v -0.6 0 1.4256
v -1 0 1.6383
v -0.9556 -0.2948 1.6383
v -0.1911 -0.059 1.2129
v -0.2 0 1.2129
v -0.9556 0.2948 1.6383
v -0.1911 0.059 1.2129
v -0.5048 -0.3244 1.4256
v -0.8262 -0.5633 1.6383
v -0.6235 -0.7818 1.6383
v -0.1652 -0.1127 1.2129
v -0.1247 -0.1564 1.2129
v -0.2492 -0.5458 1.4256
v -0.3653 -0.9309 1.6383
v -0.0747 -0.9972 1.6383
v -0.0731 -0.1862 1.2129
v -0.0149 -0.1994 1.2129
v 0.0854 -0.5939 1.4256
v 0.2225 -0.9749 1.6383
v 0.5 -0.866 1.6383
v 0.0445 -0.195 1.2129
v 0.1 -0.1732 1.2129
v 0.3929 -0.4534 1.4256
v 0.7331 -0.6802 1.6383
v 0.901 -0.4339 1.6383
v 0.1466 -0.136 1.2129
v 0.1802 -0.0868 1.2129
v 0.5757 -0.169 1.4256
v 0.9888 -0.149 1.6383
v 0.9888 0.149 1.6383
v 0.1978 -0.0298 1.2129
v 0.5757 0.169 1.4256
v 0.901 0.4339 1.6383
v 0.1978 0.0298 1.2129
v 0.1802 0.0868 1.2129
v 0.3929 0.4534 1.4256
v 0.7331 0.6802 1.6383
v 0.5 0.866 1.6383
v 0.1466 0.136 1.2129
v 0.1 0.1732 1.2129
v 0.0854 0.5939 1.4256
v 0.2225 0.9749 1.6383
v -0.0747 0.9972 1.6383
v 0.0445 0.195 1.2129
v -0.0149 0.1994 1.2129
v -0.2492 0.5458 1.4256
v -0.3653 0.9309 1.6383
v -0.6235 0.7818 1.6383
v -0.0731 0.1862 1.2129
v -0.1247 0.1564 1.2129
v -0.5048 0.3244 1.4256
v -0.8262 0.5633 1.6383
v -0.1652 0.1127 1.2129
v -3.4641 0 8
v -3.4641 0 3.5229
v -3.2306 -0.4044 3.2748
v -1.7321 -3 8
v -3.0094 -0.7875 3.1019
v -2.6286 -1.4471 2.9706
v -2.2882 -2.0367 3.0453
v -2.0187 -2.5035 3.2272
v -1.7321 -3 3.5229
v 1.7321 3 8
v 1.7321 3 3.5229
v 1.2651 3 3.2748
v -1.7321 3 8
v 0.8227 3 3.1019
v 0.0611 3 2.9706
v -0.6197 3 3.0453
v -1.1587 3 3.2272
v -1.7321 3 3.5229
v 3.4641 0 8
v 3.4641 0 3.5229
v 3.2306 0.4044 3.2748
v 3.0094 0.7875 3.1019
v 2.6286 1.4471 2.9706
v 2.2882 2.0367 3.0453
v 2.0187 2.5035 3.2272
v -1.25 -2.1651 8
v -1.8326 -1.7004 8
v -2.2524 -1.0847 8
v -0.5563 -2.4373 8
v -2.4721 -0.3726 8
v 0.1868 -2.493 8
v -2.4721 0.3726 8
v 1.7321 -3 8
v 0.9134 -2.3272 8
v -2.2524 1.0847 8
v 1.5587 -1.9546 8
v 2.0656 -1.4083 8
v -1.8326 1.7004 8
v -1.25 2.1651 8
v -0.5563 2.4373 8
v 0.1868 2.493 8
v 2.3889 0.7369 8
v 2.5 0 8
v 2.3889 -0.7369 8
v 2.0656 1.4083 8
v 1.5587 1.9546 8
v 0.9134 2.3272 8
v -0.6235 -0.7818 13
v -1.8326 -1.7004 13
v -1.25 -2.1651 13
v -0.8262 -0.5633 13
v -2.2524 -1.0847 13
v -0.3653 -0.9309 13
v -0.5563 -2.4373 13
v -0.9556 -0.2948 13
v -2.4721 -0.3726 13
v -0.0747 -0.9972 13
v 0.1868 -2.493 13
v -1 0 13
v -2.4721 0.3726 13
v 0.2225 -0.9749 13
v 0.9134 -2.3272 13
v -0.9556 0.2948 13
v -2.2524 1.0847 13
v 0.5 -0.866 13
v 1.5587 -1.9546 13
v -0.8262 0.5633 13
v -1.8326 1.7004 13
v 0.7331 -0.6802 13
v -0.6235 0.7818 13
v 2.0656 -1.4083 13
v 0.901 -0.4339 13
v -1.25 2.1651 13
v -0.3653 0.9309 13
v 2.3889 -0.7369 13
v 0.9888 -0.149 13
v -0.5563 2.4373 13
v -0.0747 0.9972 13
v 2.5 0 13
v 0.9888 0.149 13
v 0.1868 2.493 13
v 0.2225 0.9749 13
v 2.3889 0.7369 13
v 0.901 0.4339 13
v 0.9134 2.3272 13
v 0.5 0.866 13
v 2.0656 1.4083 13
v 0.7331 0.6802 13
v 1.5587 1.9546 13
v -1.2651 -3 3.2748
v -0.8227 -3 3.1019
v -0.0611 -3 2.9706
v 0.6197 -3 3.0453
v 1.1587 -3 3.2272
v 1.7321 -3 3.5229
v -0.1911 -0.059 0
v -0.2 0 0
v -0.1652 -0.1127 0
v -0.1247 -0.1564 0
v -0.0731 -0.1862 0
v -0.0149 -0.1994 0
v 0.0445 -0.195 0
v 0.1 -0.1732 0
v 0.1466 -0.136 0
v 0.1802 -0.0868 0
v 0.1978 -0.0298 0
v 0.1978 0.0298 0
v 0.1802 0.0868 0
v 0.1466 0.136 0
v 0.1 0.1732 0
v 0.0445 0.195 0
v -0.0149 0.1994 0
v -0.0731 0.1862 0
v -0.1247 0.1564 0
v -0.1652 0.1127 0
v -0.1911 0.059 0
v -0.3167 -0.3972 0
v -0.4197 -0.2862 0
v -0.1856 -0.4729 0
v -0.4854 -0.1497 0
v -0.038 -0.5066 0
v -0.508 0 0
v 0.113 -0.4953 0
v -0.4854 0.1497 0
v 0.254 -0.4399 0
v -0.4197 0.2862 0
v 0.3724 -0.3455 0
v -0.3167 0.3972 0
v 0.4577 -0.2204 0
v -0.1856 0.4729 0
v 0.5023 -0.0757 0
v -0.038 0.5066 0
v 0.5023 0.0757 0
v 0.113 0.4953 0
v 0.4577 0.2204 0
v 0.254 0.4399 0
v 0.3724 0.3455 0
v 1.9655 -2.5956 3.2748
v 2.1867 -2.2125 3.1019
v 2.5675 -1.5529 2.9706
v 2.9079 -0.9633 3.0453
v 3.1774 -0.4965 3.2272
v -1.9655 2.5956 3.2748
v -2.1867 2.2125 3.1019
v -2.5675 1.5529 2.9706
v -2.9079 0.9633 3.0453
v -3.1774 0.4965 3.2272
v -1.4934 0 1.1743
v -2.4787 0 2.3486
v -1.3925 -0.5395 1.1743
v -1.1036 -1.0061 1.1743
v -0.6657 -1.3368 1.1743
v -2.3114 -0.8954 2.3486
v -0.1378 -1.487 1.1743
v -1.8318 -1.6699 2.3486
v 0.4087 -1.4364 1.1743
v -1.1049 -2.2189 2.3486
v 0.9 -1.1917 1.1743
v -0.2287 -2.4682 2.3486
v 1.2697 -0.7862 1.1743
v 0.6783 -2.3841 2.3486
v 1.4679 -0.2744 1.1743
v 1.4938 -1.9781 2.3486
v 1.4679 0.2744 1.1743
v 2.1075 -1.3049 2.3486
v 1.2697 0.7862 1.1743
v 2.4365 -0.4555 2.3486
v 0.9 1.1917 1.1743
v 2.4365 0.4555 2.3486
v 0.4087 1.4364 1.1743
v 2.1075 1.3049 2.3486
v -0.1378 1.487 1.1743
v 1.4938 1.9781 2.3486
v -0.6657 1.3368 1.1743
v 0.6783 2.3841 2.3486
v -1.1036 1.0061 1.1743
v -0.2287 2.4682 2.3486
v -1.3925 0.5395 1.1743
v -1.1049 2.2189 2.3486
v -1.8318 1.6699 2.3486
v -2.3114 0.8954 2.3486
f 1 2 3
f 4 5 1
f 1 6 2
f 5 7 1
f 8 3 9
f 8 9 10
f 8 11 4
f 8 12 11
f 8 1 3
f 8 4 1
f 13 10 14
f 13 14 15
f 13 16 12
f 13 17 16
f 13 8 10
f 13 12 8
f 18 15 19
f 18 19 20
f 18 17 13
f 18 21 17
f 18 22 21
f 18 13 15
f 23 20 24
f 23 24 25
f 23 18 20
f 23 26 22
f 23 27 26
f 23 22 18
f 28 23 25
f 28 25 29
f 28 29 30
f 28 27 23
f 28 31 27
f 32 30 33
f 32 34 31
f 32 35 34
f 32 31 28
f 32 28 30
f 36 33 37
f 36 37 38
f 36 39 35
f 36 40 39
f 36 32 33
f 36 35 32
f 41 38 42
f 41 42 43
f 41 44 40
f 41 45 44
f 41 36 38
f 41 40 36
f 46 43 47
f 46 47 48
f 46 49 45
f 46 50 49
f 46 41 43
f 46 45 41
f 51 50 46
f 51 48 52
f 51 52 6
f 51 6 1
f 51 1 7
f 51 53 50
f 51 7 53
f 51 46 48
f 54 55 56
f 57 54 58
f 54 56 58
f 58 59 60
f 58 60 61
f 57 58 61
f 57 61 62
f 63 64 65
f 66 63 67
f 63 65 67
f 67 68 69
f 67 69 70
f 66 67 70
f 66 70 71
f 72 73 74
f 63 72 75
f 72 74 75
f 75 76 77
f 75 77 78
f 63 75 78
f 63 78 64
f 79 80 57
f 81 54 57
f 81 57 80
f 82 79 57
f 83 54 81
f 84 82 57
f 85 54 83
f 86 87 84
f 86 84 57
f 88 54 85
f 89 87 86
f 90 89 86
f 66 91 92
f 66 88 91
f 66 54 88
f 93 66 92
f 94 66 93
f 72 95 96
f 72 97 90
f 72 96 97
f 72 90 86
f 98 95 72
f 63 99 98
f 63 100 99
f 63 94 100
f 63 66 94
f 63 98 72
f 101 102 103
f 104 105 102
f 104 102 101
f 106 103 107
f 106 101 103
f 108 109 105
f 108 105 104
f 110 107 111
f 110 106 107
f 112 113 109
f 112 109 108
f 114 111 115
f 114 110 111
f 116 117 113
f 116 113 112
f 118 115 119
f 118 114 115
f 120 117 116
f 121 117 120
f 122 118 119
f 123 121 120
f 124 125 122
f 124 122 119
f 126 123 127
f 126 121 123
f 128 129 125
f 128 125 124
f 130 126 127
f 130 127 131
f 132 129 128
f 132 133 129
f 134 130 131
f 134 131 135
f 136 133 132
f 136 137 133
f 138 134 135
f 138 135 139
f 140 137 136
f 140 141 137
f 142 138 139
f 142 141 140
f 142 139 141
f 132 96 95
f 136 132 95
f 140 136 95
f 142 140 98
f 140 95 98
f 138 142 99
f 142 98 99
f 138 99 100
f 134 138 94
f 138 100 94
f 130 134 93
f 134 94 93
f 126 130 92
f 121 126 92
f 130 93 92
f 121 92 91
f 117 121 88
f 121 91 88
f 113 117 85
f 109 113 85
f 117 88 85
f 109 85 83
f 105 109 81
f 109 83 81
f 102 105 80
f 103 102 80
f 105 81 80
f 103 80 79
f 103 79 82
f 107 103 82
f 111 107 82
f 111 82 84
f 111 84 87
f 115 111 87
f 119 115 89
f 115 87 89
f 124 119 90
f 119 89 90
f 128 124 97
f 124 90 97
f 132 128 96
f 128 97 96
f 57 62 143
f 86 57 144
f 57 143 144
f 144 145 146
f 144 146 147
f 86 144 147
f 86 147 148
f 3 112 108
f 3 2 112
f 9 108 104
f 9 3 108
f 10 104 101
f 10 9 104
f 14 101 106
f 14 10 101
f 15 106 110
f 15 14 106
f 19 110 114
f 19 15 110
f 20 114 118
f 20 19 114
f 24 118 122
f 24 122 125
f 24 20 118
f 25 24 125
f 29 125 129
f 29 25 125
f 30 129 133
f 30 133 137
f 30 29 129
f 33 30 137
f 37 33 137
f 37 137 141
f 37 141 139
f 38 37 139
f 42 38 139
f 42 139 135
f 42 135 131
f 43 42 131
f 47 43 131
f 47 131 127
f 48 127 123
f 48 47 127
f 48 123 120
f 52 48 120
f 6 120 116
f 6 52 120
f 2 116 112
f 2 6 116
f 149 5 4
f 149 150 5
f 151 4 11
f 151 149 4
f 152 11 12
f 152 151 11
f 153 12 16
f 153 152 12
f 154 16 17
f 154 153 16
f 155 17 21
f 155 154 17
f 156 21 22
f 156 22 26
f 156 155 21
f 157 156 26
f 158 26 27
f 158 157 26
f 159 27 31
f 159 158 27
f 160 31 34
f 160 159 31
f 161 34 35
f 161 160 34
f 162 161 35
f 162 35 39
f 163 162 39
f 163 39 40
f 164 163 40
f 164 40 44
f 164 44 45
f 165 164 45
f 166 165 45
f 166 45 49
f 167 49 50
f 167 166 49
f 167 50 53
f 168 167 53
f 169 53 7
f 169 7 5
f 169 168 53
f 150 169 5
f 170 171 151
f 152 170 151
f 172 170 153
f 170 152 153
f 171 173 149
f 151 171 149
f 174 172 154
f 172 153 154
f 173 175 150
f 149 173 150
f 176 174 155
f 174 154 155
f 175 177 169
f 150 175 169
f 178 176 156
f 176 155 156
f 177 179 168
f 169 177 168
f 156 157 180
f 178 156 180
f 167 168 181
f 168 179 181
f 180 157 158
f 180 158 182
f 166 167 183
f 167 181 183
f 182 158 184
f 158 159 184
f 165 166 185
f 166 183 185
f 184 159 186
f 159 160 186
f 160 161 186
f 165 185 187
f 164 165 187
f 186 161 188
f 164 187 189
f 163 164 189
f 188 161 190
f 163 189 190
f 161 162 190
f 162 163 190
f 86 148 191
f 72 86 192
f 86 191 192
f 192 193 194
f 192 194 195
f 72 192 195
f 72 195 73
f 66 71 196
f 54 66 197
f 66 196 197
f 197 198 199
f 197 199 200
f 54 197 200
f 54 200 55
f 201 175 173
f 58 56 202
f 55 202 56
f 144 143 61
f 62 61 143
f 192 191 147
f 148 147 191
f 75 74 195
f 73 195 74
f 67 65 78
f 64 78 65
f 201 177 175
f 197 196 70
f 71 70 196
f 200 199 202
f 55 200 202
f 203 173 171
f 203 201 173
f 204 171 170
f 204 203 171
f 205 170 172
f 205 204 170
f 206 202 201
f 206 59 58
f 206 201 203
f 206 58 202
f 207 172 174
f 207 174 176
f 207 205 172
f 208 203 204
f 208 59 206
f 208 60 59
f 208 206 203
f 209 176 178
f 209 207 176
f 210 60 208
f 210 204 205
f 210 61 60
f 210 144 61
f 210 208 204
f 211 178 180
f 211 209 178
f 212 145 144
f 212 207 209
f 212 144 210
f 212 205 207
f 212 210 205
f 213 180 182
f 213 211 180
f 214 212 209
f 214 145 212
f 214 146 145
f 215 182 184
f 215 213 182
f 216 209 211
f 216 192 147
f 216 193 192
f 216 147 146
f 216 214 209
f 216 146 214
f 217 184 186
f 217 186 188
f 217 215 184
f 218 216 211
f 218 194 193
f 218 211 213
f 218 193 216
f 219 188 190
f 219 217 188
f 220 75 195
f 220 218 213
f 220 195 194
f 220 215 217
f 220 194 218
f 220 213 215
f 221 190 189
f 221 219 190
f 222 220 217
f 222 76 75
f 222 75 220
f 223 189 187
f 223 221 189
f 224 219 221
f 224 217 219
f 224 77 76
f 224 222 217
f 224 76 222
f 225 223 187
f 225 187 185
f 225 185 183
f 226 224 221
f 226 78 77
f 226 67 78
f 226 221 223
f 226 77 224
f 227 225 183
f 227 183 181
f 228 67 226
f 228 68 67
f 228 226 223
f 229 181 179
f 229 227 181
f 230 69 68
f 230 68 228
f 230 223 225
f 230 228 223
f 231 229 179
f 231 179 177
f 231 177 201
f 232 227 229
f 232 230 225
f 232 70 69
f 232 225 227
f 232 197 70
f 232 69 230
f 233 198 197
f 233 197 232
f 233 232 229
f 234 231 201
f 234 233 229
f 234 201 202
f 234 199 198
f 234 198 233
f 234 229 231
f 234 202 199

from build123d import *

# Parameters (mm, degrees)
BOSS_EXTRUDE1_DEPTH = 8
SKETCH3_R           = 2.5
BOSS_EXTRUDE2_DEPTH = 5


with BuildPart() as part:
    # Sketch1 → Boss-Extrude1 (new body)
    with BuildSketch(Plane.XY):
        Polygon((1.732050808, 3), (-1.732050808, 3), (-3.464101615, 0), (-1.732050808, -3), (1.732050808, -3), (3.464101615, 0), align=None)
    extrude(amount=BOSS_EXTRUDE1_DEPTH)

    # Sketch2 → Cut-Revolve1 (revolve, cut)
    with BuildSketch(Plane(origin=(0, 0, 0), x_dir=(1, 0, 0), z_dir=(0, 1, 0))):
        Polygon((-0.508, 0), (-3.464101615, -3.52294472), (-3.464101615, 0), align=None)
    revolve(axis=Axis((0, 0, 0), (0, 0, 1)), mode=Mode.SUBTRACT)

    # Sketch3 → Boss-Extrude2 (add)
    with BuildSketch(Plane.XY.offset(8)):
        Circle(SKETCH3_R)
    extrude(amount=BOSS_EXTRUDE2_DEPTH)

    # Sketch4 → Cut-Revolve2 (revolve, cut)
    with BuildSketch(Plane(origin=(0, 0, 0), x_dir=(1, 0, 0), z_dir=(0, 1, 0))):
        Polygon((0, 0), (0, -13), (-1, -13), (-1, -1.638256659), (-0.2, -1.212889113), (-0.2, 0), align=None)
    revolve(axis=Axis((0, 0, 0), (0, 0, 1)), mode=Mode.SUBTRACT)


solid = part.part
